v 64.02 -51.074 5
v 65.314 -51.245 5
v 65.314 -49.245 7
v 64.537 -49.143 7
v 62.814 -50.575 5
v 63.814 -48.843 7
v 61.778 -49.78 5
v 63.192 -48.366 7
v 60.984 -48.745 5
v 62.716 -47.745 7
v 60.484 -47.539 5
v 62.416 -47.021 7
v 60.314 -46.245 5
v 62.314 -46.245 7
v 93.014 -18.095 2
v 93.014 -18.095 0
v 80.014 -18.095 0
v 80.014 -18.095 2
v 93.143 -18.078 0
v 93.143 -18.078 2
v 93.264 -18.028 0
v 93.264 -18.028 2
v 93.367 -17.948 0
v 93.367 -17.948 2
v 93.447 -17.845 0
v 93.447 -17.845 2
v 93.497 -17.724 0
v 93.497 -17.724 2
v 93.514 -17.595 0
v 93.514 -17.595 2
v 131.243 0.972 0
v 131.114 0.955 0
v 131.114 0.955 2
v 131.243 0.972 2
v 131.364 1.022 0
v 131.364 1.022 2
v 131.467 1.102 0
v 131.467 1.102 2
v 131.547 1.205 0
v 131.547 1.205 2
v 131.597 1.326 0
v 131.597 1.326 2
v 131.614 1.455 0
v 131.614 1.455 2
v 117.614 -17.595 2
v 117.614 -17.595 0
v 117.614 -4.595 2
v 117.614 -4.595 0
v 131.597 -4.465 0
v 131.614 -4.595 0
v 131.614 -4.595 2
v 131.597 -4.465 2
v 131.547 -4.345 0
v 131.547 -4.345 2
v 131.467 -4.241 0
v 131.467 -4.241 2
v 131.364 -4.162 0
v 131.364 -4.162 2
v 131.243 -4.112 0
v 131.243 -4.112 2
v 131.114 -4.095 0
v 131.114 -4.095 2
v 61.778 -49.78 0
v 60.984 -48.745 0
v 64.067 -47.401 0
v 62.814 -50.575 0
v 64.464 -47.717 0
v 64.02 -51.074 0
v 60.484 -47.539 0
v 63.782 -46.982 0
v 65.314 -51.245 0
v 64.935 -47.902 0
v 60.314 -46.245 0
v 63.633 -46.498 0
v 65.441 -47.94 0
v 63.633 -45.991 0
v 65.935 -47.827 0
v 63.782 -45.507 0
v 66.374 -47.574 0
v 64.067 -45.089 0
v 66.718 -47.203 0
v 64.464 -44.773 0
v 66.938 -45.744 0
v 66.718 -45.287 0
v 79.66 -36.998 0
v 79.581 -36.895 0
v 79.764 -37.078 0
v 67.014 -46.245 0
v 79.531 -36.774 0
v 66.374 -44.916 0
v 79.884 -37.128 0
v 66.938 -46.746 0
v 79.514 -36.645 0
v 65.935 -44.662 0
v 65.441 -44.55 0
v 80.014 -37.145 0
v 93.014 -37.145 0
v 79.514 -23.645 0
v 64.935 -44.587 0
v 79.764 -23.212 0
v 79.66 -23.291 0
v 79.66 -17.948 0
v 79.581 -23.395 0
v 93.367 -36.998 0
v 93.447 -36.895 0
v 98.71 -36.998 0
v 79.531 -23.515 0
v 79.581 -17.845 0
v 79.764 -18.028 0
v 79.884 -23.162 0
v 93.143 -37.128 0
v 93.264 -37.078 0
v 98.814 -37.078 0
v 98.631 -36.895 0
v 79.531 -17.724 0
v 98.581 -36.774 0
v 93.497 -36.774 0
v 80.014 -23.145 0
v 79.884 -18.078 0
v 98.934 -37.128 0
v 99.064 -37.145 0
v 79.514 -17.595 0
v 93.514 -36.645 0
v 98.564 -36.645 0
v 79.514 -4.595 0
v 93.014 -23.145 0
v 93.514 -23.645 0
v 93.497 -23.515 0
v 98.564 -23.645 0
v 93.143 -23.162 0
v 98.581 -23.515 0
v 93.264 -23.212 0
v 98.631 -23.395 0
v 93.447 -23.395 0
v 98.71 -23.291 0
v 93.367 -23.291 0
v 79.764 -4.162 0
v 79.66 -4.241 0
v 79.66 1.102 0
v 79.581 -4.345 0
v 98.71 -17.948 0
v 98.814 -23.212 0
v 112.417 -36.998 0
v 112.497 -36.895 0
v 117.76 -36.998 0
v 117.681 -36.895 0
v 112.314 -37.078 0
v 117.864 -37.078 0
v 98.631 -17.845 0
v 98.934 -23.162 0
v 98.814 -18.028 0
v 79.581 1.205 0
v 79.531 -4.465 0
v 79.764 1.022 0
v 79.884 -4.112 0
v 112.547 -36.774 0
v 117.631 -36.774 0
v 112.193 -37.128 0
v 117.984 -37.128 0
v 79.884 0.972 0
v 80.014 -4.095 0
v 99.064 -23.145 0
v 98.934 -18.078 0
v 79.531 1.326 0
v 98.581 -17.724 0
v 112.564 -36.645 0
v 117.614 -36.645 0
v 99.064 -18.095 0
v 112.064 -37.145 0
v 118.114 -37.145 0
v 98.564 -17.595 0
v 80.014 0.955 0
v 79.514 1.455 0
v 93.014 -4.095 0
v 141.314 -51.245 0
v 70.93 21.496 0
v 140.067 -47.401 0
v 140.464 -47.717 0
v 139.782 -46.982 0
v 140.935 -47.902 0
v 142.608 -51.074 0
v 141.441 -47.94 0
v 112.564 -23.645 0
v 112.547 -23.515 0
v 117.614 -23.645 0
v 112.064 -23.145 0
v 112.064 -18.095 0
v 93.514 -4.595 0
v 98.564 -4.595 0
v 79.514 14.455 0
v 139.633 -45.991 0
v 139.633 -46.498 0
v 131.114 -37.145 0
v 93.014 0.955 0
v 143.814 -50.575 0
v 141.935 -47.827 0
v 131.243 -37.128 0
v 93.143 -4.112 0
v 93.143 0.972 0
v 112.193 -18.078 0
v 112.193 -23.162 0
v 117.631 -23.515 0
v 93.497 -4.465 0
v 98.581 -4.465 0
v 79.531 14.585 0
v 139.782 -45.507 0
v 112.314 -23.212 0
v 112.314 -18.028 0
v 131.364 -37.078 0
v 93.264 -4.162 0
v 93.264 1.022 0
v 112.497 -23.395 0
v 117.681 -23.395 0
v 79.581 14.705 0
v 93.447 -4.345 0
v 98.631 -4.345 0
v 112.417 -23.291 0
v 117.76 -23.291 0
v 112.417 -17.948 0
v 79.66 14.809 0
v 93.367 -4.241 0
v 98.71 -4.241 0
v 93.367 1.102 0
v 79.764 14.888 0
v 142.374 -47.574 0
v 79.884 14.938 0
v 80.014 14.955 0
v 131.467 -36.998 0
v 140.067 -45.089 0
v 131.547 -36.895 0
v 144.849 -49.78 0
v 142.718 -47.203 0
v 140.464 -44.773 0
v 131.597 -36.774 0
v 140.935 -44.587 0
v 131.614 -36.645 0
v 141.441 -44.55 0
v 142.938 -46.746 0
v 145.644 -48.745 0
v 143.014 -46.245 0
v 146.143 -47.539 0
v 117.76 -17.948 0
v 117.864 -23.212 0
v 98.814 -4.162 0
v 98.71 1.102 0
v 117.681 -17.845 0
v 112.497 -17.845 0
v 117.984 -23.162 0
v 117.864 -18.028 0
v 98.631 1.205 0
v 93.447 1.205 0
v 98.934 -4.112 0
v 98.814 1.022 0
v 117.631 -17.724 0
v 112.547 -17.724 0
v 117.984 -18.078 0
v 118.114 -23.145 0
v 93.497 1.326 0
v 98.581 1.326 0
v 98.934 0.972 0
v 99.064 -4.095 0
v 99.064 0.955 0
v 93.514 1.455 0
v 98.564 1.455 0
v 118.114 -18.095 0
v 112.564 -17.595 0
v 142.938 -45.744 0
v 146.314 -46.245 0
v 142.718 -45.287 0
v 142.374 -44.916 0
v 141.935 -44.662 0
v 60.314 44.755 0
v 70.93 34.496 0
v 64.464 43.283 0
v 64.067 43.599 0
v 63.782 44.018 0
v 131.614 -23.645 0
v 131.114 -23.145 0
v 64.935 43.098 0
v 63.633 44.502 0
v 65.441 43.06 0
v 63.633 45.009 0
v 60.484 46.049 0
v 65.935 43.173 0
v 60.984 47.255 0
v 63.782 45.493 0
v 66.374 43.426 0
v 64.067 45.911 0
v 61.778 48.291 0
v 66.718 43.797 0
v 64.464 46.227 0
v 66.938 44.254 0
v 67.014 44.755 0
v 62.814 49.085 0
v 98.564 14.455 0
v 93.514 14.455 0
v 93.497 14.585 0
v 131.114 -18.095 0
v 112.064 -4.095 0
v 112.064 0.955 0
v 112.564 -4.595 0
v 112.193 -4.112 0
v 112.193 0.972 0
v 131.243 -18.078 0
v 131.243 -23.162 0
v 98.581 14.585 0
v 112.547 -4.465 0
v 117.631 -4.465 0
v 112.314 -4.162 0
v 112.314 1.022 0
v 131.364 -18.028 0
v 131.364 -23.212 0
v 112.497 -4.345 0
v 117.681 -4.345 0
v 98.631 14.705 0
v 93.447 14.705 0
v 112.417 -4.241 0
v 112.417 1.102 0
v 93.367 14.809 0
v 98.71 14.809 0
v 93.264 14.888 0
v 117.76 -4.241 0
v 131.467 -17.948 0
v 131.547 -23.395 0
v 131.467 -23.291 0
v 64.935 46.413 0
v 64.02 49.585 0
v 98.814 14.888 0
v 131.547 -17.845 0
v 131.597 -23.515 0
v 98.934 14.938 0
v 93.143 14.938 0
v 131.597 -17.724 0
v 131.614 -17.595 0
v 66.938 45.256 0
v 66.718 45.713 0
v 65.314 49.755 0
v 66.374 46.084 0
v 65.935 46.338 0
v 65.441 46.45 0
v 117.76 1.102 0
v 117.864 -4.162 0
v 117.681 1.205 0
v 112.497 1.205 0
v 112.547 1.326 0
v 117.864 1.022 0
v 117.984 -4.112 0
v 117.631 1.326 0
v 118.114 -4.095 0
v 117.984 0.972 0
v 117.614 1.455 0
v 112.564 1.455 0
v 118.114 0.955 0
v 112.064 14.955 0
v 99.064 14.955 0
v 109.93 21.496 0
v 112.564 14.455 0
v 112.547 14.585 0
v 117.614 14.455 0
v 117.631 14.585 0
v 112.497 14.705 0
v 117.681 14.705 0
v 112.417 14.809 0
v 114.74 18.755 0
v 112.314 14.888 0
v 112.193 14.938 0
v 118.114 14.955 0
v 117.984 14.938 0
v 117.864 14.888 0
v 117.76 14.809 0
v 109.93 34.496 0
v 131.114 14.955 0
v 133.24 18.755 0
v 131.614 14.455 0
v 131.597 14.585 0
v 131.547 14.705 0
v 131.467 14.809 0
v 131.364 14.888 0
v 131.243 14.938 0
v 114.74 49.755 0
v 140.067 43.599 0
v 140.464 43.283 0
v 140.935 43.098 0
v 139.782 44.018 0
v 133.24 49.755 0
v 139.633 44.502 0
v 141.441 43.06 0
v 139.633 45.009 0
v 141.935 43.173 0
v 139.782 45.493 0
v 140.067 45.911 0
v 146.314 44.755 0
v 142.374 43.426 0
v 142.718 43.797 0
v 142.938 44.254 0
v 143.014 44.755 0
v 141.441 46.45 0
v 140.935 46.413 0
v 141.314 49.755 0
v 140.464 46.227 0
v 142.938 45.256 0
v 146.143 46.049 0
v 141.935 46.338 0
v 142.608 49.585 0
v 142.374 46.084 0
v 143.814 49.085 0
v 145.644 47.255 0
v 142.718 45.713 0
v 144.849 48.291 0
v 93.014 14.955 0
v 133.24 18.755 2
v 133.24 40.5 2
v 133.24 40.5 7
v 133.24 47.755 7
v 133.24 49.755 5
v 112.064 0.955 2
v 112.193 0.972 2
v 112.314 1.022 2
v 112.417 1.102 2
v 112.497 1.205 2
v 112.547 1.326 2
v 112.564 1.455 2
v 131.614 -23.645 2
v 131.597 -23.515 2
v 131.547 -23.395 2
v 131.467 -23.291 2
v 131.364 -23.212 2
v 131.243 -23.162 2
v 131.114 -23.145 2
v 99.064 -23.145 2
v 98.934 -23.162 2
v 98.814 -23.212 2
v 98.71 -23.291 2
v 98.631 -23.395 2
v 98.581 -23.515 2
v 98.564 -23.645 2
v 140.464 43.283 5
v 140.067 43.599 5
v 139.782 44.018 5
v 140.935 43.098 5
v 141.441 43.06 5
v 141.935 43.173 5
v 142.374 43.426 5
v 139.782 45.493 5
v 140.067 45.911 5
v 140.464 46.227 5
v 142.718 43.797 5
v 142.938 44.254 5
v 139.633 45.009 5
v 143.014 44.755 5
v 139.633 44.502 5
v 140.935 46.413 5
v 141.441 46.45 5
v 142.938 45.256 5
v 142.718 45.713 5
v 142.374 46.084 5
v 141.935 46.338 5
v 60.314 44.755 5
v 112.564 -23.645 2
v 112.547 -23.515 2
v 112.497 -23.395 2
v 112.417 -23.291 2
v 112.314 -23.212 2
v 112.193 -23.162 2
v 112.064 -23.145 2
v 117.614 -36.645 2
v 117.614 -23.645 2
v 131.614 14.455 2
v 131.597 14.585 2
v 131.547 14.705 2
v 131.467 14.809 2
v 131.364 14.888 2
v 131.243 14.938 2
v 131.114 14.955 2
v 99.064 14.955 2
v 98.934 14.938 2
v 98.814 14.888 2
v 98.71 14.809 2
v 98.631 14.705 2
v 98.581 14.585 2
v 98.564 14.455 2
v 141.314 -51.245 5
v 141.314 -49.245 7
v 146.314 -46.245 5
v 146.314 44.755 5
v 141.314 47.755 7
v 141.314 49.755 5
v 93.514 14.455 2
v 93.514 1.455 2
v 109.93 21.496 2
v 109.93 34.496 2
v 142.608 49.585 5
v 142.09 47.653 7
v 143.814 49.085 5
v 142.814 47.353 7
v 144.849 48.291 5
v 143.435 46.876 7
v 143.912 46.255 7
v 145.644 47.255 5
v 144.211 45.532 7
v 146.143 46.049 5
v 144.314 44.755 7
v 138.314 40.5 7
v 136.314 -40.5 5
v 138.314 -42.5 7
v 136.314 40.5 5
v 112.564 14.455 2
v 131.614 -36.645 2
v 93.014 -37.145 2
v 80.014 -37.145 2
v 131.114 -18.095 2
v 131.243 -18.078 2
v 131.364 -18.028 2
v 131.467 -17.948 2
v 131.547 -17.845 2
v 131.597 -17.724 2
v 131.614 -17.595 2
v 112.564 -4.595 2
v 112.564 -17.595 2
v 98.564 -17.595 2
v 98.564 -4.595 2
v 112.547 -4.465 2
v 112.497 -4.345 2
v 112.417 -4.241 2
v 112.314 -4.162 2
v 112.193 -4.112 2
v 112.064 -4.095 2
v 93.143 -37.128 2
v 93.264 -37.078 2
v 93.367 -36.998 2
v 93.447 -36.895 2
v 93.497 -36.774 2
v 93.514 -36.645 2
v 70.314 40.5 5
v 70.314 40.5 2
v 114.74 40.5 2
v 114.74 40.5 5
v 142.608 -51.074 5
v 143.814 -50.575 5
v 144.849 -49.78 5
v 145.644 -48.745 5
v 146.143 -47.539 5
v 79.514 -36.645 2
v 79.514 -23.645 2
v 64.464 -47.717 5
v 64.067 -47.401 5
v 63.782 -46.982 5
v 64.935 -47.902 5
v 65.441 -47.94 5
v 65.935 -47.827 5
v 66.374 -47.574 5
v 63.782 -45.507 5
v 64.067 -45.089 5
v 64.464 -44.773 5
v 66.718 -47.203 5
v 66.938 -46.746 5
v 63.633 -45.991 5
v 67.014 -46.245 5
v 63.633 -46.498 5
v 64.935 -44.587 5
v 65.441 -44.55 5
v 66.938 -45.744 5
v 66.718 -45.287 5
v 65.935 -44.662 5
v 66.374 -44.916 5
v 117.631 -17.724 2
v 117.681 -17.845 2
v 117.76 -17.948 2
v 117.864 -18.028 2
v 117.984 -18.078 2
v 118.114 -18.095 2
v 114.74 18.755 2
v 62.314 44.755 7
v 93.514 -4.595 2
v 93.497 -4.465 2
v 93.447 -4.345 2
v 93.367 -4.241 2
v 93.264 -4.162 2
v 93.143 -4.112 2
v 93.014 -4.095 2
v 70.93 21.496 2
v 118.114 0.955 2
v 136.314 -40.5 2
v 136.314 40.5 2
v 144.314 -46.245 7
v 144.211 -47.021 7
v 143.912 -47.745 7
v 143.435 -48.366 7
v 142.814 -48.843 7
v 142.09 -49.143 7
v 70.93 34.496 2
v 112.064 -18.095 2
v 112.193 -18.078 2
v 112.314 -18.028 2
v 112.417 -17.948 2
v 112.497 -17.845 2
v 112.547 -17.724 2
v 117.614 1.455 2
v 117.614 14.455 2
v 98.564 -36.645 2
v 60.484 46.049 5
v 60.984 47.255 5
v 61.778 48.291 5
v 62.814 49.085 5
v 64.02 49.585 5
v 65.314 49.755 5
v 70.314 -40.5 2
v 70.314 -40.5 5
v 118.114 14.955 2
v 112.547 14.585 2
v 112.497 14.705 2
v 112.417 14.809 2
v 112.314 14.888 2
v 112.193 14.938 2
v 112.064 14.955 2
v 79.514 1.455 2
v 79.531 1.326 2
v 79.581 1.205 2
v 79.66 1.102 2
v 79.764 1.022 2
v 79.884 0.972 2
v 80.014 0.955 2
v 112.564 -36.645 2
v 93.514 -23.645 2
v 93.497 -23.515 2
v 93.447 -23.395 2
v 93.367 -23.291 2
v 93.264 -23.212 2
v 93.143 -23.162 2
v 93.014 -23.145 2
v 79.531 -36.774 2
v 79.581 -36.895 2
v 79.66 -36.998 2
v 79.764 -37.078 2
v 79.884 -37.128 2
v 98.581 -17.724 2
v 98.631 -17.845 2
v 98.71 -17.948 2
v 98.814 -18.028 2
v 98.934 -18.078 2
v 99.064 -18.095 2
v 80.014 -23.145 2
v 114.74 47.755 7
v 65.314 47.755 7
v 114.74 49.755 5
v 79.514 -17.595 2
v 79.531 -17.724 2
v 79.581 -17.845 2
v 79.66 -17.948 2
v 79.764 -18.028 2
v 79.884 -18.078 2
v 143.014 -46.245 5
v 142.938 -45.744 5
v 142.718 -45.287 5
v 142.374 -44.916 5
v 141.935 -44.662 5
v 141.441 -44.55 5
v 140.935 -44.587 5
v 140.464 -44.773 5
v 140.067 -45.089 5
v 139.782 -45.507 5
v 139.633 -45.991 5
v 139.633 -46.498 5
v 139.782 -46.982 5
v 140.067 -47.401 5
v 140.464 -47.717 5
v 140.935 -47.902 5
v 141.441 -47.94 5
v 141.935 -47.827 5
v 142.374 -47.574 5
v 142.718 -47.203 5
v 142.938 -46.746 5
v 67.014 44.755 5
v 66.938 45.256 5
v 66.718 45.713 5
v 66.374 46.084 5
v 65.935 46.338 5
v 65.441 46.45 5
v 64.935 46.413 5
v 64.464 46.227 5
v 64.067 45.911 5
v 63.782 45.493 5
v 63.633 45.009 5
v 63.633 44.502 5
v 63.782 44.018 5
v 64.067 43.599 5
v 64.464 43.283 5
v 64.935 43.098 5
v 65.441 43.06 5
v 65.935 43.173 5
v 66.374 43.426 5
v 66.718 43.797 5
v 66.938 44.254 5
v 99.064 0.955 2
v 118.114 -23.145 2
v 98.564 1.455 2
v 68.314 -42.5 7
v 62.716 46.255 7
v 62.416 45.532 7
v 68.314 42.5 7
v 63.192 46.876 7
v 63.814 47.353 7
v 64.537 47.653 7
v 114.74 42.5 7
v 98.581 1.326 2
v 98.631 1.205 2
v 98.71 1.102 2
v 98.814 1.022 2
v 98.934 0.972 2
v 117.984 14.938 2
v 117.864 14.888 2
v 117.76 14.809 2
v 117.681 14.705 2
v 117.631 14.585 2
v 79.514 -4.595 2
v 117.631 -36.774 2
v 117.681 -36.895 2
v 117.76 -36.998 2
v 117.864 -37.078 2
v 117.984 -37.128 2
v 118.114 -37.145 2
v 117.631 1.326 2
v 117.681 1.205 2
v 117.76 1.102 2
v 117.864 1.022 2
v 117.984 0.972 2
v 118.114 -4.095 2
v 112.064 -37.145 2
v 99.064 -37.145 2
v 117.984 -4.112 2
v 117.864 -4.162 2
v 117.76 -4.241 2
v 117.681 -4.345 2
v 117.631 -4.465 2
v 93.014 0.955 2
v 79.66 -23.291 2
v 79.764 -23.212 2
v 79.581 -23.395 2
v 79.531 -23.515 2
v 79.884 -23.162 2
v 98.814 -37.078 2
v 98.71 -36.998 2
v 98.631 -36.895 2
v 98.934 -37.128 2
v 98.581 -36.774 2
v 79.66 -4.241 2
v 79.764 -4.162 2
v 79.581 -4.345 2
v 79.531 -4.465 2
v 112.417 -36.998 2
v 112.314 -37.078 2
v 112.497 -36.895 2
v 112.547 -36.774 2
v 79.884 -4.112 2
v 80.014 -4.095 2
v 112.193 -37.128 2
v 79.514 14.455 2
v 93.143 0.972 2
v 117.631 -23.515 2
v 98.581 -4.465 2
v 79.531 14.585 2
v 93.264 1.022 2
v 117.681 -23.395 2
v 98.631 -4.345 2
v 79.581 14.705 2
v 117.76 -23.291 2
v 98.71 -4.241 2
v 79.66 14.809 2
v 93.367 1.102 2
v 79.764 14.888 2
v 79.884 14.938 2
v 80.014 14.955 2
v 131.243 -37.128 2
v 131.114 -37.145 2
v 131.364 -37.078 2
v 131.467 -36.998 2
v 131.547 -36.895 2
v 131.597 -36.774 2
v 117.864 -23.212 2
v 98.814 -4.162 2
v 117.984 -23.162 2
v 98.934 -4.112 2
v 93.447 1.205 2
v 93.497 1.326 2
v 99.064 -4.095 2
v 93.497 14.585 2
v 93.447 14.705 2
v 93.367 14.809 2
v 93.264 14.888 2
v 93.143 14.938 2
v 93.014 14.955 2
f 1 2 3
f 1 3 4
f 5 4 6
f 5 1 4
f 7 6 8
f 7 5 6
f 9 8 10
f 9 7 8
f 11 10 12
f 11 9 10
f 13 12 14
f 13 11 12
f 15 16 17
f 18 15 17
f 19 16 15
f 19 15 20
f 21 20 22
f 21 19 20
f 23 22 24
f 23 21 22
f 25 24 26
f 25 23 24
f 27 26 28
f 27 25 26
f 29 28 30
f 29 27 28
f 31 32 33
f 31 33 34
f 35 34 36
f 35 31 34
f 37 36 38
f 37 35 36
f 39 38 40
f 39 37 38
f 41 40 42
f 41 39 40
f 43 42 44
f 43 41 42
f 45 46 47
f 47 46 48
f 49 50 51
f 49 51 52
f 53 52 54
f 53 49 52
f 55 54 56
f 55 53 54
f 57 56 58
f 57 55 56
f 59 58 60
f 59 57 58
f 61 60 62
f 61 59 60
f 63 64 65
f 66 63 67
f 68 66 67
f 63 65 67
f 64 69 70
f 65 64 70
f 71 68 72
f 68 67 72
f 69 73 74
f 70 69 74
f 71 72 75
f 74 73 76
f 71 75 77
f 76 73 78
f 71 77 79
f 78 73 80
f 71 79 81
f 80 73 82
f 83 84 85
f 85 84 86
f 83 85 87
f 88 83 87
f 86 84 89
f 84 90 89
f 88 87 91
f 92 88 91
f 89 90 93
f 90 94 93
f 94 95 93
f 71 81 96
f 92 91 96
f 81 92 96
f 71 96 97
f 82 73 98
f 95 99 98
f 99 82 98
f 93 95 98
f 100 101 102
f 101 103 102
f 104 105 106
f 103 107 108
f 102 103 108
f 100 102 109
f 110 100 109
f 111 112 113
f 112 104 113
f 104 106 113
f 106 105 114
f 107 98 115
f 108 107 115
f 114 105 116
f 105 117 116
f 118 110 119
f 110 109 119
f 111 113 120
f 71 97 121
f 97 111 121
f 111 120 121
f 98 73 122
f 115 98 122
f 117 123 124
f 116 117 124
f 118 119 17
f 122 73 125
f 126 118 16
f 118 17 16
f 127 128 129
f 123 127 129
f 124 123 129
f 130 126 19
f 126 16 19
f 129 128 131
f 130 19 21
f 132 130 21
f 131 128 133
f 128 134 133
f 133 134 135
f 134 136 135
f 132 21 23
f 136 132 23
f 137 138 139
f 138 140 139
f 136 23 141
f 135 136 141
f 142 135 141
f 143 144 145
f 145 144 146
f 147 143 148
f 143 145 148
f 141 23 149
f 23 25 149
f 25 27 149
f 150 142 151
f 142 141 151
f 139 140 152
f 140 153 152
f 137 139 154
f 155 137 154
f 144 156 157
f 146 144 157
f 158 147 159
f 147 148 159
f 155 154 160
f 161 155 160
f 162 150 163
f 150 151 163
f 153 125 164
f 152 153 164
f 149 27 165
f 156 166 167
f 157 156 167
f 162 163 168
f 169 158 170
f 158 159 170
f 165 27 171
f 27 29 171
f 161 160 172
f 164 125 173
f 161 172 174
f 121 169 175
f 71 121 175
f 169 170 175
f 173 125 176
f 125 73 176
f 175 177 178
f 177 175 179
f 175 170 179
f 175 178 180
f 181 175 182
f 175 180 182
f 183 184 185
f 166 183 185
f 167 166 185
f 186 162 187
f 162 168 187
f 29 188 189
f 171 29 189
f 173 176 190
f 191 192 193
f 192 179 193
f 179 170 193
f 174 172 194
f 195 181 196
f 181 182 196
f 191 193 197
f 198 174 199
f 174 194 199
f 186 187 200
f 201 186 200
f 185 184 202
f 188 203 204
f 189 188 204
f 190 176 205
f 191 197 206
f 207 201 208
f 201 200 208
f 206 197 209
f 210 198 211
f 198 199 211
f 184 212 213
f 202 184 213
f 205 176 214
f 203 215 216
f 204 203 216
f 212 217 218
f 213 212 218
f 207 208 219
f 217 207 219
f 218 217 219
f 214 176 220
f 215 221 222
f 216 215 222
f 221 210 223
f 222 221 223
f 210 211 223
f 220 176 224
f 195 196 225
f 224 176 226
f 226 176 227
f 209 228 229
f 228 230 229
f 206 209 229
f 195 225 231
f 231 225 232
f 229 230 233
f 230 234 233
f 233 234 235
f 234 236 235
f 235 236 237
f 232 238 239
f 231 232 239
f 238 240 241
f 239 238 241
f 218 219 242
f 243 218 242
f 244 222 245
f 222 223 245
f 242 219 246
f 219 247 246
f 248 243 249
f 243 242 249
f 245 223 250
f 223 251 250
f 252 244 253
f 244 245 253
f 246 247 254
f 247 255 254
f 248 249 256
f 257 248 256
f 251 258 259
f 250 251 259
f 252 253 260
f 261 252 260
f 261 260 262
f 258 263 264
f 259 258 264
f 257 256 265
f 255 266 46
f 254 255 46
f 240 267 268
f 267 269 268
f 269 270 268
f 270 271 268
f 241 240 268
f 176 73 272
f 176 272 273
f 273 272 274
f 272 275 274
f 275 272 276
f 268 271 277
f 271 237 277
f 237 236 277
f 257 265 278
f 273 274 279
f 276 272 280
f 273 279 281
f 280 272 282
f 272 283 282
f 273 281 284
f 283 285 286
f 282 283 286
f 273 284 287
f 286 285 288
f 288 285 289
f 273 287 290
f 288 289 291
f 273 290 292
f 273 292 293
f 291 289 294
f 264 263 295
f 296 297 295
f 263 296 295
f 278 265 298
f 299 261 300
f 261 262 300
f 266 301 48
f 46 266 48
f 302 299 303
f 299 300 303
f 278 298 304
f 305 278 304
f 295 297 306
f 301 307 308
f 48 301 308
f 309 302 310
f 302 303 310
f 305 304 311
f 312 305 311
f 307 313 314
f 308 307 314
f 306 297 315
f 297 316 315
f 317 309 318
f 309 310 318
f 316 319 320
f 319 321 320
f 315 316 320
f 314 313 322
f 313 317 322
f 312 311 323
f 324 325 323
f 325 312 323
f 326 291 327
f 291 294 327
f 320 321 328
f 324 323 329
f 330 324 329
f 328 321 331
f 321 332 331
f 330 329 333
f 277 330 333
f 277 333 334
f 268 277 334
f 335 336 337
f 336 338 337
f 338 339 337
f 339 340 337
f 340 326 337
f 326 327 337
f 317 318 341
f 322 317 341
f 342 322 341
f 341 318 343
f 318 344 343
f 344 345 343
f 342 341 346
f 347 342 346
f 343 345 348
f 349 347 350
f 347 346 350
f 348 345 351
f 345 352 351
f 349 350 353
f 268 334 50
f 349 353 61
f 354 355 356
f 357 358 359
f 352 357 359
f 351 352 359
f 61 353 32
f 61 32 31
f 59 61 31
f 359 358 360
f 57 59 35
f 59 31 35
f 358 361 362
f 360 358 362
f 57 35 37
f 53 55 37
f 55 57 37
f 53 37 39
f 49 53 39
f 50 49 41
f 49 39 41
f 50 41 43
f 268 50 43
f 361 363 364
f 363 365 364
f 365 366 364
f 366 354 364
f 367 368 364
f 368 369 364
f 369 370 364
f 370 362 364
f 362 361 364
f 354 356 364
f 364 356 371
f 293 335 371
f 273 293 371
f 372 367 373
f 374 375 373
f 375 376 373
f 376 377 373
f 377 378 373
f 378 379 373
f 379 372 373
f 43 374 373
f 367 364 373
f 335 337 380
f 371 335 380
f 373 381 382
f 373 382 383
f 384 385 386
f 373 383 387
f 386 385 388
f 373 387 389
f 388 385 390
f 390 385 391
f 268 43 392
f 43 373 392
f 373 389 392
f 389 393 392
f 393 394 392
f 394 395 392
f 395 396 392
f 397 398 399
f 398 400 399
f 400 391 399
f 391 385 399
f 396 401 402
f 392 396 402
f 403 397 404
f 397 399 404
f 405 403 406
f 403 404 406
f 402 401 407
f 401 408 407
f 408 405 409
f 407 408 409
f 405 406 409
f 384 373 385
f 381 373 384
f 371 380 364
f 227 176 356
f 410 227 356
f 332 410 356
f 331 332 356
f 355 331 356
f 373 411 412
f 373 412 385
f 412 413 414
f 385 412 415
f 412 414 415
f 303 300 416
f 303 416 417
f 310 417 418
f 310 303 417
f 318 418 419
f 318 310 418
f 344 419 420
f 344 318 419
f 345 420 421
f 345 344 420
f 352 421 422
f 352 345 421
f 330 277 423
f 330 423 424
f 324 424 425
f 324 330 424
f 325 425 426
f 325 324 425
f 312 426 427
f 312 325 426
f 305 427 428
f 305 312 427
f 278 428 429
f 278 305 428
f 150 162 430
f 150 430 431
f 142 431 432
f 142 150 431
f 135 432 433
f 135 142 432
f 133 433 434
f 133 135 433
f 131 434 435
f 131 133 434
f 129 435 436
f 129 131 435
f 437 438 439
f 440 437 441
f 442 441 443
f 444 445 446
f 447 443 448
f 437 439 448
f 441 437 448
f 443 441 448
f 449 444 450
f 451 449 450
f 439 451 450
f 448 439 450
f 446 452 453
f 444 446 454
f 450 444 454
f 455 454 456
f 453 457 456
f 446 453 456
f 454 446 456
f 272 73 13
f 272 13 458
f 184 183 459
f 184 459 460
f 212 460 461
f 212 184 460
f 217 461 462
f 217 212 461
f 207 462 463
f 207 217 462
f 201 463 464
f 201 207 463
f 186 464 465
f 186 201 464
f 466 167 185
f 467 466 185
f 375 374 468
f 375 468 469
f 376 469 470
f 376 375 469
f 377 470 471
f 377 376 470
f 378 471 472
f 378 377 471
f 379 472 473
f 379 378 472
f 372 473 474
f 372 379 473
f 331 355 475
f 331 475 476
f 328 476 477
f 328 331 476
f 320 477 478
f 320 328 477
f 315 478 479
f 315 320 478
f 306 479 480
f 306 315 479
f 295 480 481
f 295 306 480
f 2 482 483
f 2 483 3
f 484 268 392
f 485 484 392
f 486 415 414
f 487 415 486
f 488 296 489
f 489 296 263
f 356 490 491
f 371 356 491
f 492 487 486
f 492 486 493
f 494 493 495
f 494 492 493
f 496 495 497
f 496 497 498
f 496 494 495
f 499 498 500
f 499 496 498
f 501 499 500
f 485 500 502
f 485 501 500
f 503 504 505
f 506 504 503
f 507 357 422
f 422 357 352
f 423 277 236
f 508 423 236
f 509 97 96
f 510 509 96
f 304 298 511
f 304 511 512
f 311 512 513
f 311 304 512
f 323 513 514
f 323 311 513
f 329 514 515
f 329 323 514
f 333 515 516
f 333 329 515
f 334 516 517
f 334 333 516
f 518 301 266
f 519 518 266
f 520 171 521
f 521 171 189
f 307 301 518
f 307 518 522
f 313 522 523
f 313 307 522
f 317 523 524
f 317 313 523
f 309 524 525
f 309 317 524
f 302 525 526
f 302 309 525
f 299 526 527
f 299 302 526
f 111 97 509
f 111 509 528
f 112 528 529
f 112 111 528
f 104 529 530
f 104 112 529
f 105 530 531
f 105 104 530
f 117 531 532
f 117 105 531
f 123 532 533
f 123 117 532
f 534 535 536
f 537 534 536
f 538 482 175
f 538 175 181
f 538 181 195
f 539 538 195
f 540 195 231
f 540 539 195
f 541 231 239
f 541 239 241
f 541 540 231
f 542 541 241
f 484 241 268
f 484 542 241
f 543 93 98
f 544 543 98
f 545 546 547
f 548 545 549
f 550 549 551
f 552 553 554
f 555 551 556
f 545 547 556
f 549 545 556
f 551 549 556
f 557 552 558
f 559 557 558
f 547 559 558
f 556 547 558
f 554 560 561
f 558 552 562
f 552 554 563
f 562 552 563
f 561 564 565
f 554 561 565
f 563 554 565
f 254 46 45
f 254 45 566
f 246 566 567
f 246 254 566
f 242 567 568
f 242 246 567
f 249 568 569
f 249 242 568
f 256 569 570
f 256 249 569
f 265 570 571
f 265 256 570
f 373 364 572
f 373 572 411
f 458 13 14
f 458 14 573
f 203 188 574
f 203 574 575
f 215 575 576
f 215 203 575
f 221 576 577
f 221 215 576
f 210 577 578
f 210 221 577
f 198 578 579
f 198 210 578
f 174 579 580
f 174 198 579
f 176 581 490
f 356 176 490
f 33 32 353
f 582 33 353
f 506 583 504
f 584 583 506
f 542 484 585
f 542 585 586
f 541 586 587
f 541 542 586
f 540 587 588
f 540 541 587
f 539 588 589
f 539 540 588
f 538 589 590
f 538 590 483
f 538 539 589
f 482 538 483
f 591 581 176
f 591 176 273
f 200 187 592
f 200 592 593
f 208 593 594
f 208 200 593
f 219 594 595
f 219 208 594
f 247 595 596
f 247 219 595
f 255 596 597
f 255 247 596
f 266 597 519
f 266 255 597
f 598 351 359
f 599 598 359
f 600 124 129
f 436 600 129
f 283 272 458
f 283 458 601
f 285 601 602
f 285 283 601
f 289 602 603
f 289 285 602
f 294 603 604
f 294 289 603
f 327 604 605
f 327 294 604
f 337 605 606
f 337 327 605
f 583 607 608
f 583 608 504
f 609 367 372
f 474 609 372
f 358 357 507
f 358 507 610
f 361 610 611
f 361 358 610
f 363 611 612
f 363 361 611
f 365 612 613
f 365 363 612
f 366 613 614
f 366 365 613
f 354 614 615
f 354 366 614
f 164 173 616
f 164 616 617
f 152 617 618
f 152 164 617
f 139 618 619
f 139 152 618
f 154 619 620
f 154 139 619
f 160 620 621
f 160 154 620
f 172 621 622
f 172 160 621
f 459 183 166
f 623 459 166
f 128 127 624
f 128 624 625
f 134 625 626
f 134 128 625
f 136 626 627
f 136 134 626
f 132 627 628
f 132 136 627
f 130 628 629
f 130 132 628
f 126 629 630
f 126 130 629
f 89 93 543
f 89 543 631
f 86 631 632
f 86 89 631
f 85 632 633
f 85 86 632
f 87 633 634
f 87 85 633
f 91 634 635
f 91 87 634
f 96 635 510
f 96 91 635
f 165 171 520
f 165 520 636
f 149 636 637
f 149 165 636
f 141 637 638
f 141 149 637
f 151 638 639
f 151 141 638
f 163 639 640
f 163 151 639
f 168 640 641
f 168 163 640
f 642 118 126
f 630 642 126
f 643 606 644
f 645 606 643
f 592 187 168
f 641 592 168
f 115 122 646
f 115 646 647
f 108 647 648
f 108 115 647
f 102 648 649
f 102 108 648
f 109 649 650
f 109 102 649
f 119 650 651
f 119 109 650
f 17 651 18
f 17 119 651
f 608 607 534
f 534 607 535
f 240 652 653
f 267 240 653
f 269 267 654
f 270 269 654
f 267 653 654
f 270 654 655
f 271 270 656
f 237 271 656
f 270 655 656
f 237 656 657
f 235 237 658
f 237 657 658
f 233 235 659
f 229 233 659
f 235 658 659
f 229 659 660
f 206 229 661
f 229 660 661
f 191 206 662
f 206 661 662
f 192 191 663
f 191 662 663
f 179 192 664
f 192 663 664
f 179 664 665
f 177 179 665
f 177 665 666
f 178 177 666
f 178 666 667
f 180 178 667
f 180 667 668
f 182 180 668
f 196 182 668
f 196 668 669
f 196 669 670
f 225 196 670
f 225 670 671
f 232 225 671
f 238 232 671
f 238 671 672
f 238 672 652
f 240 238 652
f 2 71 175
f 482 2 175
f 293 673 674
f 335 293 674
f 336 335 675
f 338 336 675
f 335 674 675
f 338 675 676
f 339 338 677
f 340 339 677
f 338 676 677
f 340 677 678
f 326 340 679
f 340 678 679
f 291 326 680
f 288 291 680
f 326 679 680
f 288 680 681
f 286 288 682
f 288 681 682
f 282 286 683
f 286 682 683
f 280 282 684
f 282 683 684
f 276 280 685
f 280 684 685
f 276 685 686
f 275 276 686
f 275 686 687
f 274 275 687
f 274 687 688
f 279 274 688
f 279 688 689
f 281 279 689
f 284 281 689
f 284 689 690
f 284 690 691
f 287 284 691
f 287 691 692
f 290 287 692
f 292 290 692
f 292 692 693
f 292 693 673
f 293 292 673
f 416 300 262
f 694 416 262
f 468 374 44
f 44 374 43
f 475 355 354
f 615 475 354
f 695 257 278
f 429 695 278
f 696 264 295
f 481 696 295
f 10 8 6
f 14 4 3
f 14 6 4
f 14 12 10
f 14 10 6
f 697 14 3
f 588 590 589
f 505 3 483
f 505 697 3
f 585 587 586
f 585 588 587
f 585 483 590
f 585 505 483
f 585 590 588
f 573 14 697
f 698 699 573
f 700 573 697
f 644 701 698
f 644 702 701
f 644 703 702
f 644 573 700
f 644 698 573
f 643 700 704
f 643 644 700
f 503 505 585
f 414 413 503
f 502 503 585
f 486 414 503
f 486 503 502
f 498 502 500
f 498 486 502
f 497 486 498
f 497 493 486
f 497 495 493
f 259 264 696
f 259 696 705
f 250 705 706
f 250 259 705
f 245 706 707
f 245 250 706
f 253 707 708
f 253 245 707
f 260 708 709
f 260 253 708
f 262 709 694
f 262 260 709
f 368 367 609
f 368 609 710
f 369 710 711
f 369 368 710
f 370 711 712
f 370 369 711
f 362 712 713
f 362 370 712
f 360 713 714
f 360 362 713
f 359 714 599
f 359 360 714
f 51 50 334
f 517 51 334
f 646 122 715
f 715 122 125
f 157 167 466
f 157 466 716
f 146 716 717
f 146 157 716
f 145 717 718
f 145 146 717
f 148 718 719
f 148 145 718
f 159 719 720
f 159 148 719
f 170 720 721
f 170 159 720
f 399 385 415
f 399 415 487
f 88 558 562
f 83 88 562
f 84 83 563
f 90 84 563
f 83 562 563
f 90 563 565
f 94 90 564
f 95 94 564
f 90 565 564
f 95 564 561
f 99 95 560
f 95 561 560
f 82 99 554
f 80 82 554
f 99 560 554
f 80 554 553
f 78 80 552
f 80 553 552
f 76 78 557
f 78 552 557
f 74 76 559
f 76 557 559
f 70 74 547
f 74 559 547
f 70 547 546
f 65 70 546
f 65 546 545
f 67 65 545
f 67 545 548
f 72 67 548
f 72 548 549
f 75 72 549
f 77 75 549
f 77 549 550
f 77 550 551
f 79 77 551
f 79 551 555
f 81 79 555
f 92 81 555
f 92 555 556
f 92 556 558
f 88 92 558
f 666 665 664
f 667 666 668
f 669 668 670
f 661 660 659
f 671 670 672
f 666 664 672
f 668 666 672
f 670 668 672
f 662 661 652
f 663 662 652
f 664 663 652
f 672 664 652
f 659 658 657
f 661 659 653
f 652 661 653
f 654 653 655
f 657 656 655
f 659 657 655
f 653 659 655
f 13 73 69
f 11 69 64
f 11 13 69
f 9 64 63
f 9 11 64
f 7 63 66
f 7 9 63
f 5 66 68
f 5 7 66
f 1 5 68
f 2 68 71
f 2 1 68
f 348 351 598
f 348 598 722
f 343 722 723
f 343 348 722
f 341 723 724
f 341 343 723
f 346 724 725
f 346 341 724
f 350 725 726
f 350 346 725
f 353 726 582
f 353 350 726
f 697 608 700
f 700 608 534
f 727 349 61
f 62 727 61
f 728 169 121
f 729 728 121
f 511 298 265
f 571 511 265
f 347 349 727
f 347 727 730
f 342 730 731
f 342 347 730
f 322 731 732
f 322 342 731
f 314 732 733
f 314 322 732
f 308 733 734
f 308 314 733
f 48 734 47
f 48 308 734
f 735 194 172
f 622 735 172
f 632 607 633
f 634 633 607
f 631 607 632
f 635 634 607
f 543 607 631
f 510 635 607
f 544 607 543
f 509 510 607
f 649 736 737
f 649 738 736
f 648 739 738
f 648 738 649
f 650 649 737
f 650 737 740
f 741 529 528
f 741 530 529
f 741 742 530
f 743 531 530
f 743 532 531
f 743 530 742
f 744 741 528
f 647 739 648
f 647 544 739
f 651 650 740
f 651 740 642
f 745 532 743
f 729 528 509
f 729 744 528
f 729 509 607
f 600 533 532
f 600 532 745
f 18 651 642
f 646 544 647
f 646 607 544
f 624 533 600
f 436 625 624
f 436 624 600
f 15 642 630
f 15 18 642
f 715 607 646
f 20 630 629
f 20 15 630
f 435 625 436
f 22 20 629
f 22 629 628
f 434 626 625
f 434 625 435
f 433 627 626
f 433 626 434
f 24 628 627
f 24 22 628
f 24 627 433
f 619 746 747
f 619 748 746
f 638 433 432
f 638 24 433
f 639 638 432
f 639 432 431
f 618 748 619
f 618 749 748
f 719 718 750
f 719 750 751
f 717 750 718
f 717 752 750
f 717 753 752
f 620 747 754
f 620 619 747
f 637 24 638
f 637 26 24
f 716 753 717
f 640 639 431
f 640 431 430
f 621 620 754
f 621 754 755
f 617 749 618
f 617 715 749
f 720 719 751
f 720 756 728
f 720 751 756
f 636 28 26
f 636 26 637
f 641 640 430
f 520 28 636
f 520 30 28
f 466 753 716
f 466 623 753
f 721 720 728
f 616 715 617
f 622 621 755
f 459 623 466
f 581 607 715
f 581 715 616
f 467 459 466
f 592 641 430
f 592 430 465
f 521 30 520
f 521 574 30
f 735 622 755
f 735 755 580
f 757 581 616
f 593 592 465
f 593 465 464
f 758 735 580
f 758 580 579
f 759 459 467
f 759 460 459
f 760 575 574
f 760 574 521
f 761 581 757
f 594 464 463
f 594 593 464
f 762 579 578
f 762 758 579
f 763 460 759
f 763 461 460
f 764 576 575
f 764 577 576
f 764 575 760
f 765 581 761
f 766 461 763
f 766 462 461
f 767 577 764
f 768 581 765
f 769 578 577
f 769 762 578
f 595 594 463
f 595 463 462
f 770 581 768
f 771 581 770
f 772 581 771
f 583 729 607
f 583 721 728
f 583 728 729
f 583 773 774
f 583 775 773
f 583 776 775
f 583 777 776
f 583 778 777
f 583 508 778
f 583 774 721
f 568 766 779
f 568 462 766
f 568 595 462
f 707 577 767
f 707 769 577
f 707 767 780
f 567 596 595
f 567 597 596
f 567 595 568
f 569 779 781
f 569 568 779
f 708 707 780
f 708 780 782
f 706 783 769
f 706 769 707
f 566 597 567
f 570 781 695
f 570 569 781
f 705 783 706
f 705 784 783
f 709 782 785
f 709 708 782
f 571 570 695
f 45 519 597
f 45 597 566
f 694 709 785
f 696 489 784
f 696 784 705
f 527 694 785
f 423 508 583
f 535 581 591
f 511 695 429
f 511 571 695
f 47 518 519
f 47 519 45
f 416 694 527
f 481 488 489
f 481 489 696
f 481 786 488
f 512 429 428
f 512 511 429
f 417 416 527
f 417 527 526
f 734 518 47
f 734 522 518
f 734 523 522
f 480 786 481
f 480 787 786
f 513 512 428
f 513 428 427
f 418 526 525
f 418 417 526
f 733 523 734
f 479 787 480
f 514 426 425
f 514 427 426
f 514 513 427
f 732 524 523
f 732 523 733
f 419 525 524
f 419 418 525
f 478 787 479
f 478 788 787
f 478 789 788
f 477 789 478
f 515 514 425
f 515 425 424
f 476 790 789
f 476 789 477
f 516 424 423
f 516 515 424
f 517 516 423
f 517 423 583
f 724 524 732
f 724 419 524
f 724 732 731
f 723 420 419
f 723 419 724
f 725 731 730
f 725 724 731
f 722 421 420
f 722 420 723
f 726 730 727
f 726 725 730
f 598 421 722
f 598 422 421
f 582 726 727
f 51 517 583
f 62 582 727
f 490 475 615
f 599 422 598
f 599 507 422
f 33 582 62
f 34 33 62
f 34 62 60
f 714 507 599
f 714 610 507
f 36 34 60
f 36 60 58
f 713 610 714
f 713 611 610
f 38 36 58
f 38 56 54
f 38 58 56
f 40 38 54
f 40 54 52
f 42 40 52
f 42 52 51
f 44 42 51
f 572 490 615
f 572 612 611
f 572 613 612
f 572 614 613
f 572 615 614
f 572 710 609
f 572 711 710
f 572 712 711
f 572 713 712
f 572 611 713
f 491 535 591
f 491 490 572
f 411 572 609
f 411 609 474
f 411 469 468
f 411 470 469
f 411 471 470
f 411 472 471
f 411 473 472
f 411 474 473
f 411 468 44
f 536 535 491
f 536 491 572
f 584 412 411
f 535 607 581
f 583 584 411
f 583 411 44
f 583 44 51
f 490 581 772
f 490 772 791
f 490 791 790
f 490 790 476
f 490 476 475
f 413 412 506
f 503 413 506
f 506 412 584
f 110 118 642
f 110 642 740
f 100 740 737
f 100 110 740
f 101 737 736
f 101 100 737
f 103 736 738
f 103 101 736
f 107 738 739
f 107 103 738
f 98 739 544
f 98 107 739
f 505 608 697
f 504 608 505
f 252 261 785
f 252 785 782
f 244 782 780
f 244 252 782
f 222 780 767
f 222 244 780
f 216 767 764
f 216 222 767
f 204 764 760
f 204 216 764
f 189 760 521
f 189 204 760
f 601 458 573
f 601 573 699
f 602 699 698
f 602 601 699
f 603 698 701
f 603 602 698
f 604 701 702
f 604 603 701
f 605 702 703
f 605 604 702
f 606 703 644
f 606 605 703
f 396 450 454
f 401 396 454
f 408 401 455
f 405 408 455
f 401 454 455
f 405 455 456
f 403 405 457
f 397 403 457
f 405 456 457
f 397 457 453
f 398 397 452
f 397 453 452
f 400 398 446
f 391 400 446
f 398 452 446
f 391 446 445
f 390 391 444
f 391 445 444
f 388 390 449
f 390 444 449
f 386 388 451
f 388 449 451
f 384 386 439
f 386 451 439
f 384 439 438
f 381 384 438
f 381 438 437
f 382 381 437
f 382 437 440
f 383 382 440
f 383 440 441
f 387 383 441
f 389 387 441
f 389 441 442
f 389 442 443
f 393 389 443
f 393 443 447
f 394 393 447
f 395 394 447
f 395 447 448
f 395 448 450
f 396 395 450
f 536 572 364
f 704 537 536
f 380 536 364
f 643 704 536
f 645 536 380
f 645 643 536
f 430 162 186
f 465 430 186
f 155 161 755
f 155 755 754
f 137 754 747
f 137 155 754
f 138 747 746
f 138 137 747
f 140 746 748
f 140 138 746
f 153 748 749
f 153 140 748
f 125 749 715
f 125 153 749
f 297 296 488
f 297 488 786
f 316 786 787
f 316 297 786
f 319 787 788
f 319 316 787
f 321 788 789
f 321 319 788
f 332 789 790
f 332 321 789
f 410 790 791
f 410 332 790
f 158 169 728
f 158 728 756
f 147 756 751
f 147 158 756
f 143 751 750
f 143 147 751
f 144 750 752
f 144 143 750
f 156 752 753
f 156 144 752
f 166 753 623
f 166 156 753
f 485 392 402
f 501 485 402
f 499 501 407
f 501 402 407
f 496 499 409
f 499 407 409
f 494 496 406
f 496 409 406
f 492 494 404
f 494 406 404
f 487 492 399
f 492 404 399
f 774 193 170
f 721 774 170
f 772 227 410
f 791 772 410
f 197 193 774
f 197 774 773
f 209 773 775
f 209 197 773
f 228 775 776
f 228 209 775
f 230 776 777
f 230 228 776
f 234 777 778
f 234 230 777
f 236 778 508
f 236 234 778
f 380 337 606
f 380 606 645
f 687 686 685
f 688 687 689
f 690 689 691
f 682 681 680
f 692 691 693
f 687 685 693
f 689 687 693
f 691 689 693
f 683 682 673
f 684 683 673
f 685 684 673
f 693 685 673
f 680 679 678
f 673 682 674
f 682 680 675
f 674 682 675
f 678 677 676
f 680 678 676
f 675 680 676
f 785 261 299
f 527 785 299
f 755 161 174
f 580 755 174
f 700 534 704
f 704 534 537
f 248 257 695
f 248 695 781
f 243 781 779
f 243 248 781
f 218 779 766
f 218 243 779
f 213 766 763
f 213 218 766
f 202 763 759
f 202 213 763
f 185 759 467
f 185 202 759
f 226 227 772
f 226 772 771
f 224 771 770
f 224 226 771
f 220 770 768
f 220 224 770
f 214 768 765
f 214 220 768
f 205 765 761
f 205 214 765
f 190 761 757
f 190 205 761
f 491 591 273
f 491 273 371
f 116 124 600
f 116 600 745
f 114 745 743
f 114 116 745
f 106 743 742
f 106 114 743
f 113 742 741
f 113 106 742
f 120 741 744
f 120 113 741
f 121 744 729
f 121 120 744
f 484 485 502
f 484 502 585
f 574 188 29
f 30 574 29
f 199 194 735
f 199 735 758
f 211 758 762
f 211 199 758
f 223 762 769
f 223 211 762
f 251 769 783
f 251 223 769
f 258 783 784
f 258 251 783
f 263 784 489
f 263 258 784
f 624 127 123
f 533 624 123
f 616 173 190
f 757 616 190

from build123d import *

# Parameters (mm, degrees)
SKETCH006_W     = 86
SKETCH006_H     = 101
SKETCH006_R     = 1.7
PAD002_DEPTH    = 2
SKETCH007_W     = 18.5
SKETCH007_H     = 31
SKETCH007_W_2   = 39
SKETCH007_H_2   = 13
POCKET002_DEPTH = 5
SKETCH008_W     = 86
SKETCH008_H     = 101
SKETCH008_W_2   = 66
SKETCH008_H_2   = 81
PAD003_DEPTH    = 3
SKETCH009_R     = 1.7
POCKET003_DEPTH = 3
SKETCH010_W     = 86
SKETCH010_H     = 101
SKETCH010_W_2   = 66
SKETCH010_H_2   = 81
PAD004_DEPTH    = 2
SKETCH011_W     = 18.5
SKETCH011_H     = 31
POCKET004_DEPTH = 5
FILLET001_R     = 5
CHAMFER_SIZE    = 2
CHAMFER001_SIZE = 2


with BuildPart() as part:
    # Sketch006 → Pad002 (new body)
    with BuildSketch(Plane.XY):
        with Locations((103.313661, -0.74487)):
            Rectangle(SKETCH006_W, SKETCH006_H)
        with Locations((141.313661, 44.75513)):
            Circle(SKETCH006_R, mode=Mode.SUBTRACT)
        with Locations((141.313661, -46.24487)):
            Circle(SKETCH006_R, mode=Mode.SUBTRACT)
        with Locations((65.313661, -46.24487)):
            Circle(SKETCH006_R, mode=Mode.SUBTRACT)
        with Locations((65.313661, 44.75513)):
            Circle(SKETCH006_R, mode=Mode.SUBTRACT)
        with BuildLine():
            Line((93.013661, 0.95513), (80.013661, 0.95513))
            ThreePointArc((79.513661, 1.45513), (79.660108, 1.101576), (80.013661, 0.95513))
            Line((79.513661, 1.45513), (79.513661, 14.45513))
            ThreePointArc((80.013661, 14.95513), (79.660108, 14.808683), (79.513661, 14.45513))
            Line((80.013661, 14.95513), (93.013661, 14.95513))
            ThreePointArc((93.513661, 14.45513), (93.367214, 14.808683), (93.013661, 14.95513))
            Line((93.513661, 14.45513), (93.513661, 1.45513))
            ThreePointArc((93.013661, 0.95513), (93.367214, 1.101576), (93.513661, 1.45513))
        make_face(mode=Mode.SUBTRACT)
        with BuildLine():
            Line((112.063661, 0.95513), (99.063661, 0.95513))
            ThreePointArc((98.563661, 1.45513), (98.710108, 1.101576), (99.063661, 0.95513))
            Line((98.563661, 1.45513), (98.563661, 14.45513))
            ThreePointArc((99.063661, 14.95513), (98.710108, 14.808683), (98.563661, 14.45513))
            Line((99.063661, 14.95513), (112.063661, 14.95513))
            ThreePointArc((112.563661, 14.45513), (112.417214, 14.808683), (112.063661, 14.95513))
            Line((112.563661, 14.45513), (112.563661, 1.45513))
            ThreePointArc((112.063661, 0.95513), (112.417214, 1.101576), (112.563661, 1.45513))
        make_face(mode=Mode.SUBTRACT)
        with BuildLine():
            Line((131.113661, 0.95513), (118.113661, 0.95513))
            ThreePointArc((117.613661, 1.45513), (117.760108, 1.101576), (118.113661, 0.95513))
            Line((117.613661, 1.45513), (117.613661, 14.45513))
            ThreePointArc((118.113661, 14.95513), (117.760108, 14.808683), (117.613661, 14.45513))
            Line((118.113661, 14.95513), (131.113661, 14.95513))
            ThreePointArc((131.613661, 14.45513), (131.467214, 14.808683), (131.113661, 14.95513))
            Line((131.613661, 14.45513), (131.613661, 1.45513))
            ThreePointArc((131.113661, 0.95513), (131.467214, 1.101576), (131.613661, 1.45513))
        make_face(mode=Mode.SUBTRACT)
        with BuildLine():
            Line((93.013661, -18.09487), (80.013661, -18.09487))
            ThreePointArc((79.513661, -17.59487), (79.660108, -17.948424), (80.013661, -18.09487))
            Line((79.513661, -17.59487), (79.513661, -4.59487))
            ThreePointArc((80.013661, -4.09487), (79.660108, -4.241317), (79.513661, -4.59487))
            Line((80.013661, -4.09487), (93.013661, -4.09487))
            ThreePointArc((93.513661, -4.59487), (93.367214, -4.241317), (93.013661, -4.09487))
            Line((93.513661, -4.59487), (93.513661, -17.59487))
            ThreePointArc((93.013661, -18.09487), (93.367214, -17.948424), (93.513661, -17.59487))
        make_face(mode=Mode.SUBTRACT)
        with BuildLine():
            Line((112.063661, -18.09487), (99.063661, -18.09487))
            ThreePointArc((98.563661, -17.59487), (98.710108, -17.948424), (99.063661, -18.09487))
            Line((98.563661, -17.59487), (98.563661, -4.59487))
            ThreePointArc((99.063661, -4.09487), (98.710108, -4.241317), (98.563661, -4.59487))
            Line((99.063661, -4.09487), (112.063661, -4.09487))
            ThreePointArc((112.563661, -4.59487), (112.417214, -4.241317), (112.063661, -4.09487))
            Line((112.563661, -4.59487), (112.563661, -17.59487))
            ThreePointArc((112.063661, -18.09487), (112.417214, -17.948424), (112.563661, -17.59487))
        make_face(mode=Mode.SUBTRACT)
        with BuildLine():
            Line((131.113661, -18.09487), (118.113661, -18.09487))
            ThreePointArc((117.613661, -17.59487), (117.760108, -17.948424), (118.113661, -18.09487))
            Line((117.613661, -17.59487), (117.613661, -4.59487))
            ThreePointArc((118.113661, -4.09487), (117.760108, -4.241317), (117.613661, -4.59487))
            Line((118.113661, -4.09487), (131.113661, -4.09487))
            ThreePointArc((131.613661, -4.59487), (131.467214, -4.241317), (131.113661, -4.09487))
            Line((131.613661, -4.59487), (131.613661, -17.59487))
            ThreePointArc((131.113661, -18.09487), (131.467214, -17.948424), (131.613661, -17.59487))
        make_face(mode=Mode.SUBTRACT)
        with BuildLine():
            Line((93.013661, -37.14487), (80.013661, -37.14487))
            ThreePointArc((79.513661, -36.64487), (79.660108, -36.998424), (80.013661, -37.14487))
            Line((79.513661, -36.64487), (79.513661, -23.64487))
            ThreePointArc((80.013661, -23.14487), (79.660108, -23.291317), (79.513661, -23.64487))
            Line((80.013661, -23.14487), (93.013661, -23.14487))
            ThreePointArc((93.513661, -23.64487), (93.367214, -23.291317), (93.013661, -23.14487))
            Line((93.513661, -23.64487), (93.513661, -36.64487))
            ThreePointArc((93.013661, -37.14487), (93.367214, -36.998424), (93.513661, -36.64487))
        make_face(mode=Mode.SUBTRACT)
        with BuildLine():
            Line((112.063661, -37.14487), (99.063661, -37.14487))
            ThreePointArc((98.563661, -36.64487), (98.710108, -36.998424), (99.063661, -37.14487))
            Line((98.563661, -36.64487), (98.563661, -23.64487))
            ThreePointArc((99.063661, -23.14487), (98.710108, -23.291317), (98.563661, -23.64487))
            Line((99.063661, -23.14487), (112.063661, -23.14487))
            ThreePointArc((112.563661, -23.64487), (112.417214, -23.291317), (112.063661, -23.14487))
            Line((112.563661, -23.64487), (112.563661, -36.64487))
            ThreePointArc((112.063661, -37.14487), (112.417214, -36.998424), (112.563661, -36.64487))
        make_face(mode=Mode.SUBTRACT)
        with BuildLine():
            Line((131.113661, -37.14487), (118.113661, -37.14487))
            ThreePointArc((117.613661, -36.64487), (117.760108, -36.998424), (118.113661, -37.14487))
            Line((117.613661, -36.64487), (117.613661, -23.64487))
            ThreePointArc((118.113661, -23.14487), (117.760108, -23.291317), (117.613661, -23.64487))
            Line((118.113661, -23.14487), (131.113661, -23.14487))
            ThreePointArc((131.613661, -23.64487), (131.467214, -23.291317), (131.113661, -23.14487))
            Line((131.613661, -23.64487), (131.613661, -36.64487))
            ThreePointArc((131.113661, -37.14487), (131.467214, -36.998424), (131.613661, -36.64487))
        make_face(mode=Mode.SUBTRACT)
    extrude(amount=PAD002_DEPTH)

    # Sketch007 → Pocket002 (cut, symmetric)
    with BuildSketch(Plane.XY.offset(2)):
        with Locations((123.989661, 34.25513)):
            Rectangle(SKETCH007_W, SKETCH007_H)
        with Locations((90.429661, 27.99613)):
            Rectangle(SKETCH007_W_2, SKETCH007_H_2)
    extrude(amount=POCKET002_DEPTH, both=True, mode=Mode.SUBTRACT)

    # Sketch008 (on Face5 of Pocket002) → Pad003 (join)
    with BuildSketch(Plane.XY.offset(2)):
        with Locations((103.313661, -0.74487)):
            Rectangle(SKETCH008_W, SKETCH008_H)
        with Locations((103.313661, 0)):
            Rectangle(SKETCH008_W_2, SKETCH008_H_2, mode=Mode.SUBTRACT)
    extrude(amount=PAD003_DEPTH)

    # Sketch009 (on Face92 of Pad003) → Pocket003 (cut)
    with BuildSketch(Plane.XY.offset(5)):
        with Locations((65.313661, 44.75513)):
            Circle(SKETCH009_R)
        with Locations((141.313661, 44.75513)):
            Circle(SKETCH009_R)
        with Locations((141.313661, -46.24487)):
            Circle(SKETCH009_R)
        with Locations((65.313661, -46.24487)):
            Circle(SKETCH009_R)
    extrude(amount=-POCKET003_DEPTH, mode=Mode.SUBTRACT)

    # Sketch010 (on Face85 of Pocket003) → Pad004 (join)
    with BuildSketch(Plane.XY.offset(5)):
        with Locations((103.313661, -0.74487)):
            Rectangle(SKETCH010_W, SKETCH010_H)
        with Locations((103.313661, 0)):
            Rectangle(SKETCH010_W_2, SKETCH010_H_2, mode=Mode.SUBTRACT)
    extrude(amount=PAD004_DEPTH)

    # Sketch011 (on Face92 of Pad004) → Pocket004 (cut)
    with BuildSketch(Plane.XY.offset(7)):
        with Locations((123.989661, 34.25513)):
            Rectangle(SKETCH011_W, SKETCH011_H)
    extrude(amount=-POCKET004_DEPTH, mode=Mode.SUBTRACT)

    # Fillet001
    fillet001_edges = [part.edges().sort_by_distance(p)[0] for p in [
        (146.313661, -51.24487, 3.5),
        (60.313661, -51.24487, 3.5),
        (146.313661, 49.75513, 3.5),
        (60.313661, 49.75513, 3.5),
    ]]
    fillet(fillet001_edges, radius=FILLET001_R)

    # Chamfer
    chamfer_edges = [part.edges().sort_by_distance(p)[0] for p in [
        (103.313661, -40.5, 7),
        (136.313661, 0, 7),
        (70.313661, 0, 7),
        (92.526661, 40.5, 7),
    ]]
    chamfer(chamfer_edges, length=CHAMFER_SIZE)

    # Chamfer001
    chamfer001_edges = [part.edges().sort_by_distance(p)[0] for p in [
        (60.313661, -0.74487, 7),
        (103.313661, -51.24487, 7),
        (61.778127, -49.780404, 7),
        (144.849195, -49.780404, 7),
        (146.313661, -0.74487, 7),
        (144.849195, 48.290663, 7),
        (137.276661, 49.75513, 7),
        (61.778127, 48.290663, 7),
        (90.026661, 49.75513, 7),
    ]]
    chamfer(chamfer001_edges, length=CHAMFER001_SIZE)


solid = part.part
